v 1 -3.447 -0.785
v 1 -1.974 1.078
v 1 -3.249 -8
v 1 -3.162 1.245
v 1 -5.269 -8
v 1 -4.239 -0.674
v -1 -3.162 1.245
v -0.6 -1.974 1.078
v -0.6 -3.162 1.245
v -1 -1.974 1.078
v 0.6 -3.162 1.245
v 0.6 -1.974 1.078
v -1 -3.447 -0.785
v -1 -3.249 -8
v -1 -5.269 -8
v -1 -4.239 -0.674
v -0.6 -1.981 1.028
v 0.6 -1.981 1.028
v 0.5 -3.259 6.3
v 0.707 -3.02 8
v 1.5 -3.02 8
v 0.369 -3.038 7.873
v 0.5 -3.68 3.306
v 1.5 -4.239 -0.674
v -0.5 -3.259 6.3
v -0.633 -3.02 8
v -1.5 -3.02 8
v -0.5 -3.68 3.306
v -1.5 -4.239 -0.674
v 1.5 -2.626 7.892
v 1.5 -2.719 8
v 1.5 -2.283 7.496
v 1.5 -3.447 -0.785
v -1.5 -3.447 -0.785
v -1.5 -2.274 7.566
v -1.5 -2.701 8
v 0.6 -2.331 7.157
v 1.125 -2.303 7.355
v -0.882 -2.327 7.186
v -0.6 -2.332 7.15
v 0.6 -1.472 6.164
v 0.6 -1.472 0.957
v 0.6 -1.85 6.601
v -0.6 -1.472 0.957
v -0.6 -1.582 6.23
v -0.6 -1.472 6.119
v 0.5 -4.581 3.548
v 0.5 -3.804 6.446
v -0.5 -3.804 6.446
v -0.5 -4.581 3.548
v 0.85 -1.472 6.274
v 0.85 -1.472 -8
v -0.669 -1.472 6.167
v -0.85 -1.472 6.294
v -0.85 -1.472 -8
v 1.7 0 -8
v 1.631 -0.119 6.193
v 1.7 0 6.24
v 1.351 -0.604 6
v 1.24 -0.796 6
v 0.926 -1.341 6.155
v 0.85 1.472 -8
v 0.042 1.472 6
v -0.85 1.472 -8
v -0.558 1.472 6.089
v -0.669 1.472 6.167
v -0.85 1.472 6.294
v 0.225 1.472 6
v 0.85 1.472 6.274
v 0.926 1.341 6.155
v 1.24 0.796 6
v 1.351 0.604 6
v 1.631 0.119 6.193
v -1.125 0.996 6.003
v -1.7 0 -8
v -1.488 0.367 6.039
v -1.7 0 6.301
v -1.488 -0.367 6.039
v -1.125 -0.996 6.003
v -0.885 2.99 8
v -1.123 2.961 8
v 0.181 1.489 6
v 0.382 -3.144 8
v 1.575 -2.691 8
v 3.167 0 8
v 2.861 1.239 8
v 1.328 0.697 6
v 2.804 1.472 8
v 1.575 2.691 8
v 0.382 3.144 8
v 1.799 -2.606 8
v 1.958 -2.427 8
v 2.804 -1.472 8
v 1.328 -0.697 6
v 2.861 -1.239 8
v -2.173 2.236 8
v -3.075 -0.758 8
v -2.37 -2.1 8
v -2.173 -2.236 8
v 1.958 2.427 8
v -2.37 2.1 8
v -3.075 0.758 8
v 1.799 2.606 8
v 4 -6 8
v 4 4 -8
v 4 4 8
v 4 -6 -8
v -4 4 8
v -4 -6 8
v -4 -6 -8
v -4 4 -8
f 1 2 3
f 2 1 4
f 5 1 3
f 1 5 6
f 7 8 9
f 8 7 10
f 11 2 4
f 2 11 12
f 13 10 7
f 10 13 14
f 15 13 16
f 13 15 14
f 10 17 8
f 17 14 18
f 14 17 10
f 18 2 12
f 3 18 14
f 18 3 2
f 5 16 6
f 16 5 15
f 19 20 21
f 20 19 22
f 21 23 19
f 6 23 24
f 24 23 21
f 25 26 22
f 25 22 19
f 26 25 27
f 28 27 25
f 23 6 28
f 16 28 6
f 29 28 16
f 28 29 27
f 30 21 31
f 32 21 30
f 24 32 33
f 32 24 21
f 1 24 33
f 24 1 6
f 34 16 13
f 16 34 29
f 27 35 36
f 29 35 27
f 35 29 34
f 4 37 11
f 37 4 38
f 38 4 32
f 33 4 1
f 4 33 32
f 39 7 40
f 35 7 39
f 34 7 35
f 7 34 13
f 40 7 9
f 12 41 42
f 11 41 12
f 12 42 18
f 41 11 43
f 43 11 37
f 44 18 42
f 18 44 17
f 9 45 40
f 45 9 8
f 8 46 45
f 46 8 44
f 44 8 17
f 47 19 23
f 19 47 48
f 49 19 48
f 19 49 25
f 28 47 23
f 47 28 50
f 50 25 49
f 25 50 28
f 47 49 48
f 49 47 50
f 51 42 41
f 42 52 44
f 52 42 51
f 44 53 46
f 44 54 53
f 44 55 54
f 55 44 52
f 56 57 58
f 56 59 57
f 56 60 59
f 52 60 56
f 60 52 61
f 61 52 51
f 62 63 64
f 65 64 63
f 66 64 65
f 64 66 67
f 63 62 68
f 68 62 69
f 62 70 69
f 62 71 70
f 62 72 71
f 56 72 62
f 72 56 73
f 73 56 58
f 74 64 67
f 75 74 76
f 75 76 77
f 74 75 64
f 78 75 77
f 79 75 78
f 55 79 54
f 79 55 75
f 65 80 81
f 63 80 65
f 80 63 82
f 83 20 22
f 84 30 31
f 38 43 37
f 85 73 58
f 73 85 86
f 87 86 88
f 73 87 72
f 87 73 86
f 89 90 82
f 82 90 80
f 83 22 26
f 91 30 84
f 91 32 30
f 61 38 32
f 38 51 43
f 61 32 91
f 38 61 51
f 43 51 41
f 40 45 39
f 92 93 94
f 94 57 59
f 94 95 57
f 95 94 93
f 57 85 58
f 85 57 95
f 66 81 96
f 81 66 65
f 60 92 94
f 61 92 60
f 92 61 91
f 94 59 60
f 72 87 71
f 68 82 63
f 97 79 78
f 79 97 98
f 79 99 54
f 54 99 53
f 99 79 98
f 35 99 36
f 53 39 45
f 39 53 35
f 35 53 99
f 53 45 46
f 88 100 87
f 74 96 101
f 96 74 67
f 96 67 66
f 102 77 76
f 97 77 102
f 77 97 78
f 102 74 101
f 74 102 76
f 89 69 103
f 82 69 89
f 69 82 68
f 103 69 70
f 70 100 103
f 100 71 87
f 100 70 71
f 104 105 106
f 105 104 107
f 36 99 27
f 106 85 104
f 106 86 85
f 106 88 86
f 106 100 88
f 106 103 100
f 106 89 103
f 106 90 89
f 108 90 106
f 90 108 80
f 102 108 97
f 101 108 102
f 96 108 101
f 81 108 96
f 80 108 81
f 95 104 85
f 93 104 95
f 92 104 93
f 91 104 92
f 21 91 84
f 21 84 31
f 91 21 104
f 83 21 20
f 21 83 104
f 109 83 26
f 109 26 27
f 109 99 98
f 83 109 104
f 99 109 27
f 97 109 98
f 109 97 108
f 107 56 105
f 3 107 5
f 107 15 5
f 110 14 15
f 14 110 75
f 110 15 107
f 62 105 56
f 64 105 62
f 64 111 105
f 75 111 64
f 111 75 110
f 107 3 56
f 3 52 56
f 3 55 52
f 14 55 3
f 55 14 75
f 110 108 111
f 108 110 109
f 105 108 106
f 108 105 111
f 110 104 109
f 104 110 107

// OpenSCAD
// $fn = 60;

// Pin position with angular coordinates
module make_pin() {
	r_pin_circle = 44 / 2;
	alpha = 360 / 14;

	for (i=[0:13])
		rotate([0, 0, (i + 0.5) * alpha])
			translate([0, r_pin_circle, 0])
				children();
}

module contact() {
	rotate([0, 90, 0])
		linear_extrude(1.5, center=true)
			translate([-0.7, -1.25, 0])
				import("spring.svg");
}

module pin() {
	translate([0, 0, -3])
		cylinder(h=6, d1=3, d2=2.25, center=true);

	translate([0, 0, 3])
		cylinder(h=6, d2=3, d1=2.25, center=true);
}

module pocket() {
	// Square section for cable and crimp connection
	translate([0, -3, -5])
		cube(size=[2.0, 2.0, 10.1], center=true);
	// Wider section at the top, for the flat end of the contact
	translate([0, -3.6, 3])
		cube(size=[3.0, 0.8, 10], center=true);
	// Opening for the contact spring
	translate([0, -2.5, 3.5])
		cube(size=[1.2, 3, 7], center=true);
	// Pocket for the little hook to engage in
	translate([0, -3.75, 3.5])
		rotate([-7, 0, 0])
			cube(size=[1, 2, 3], center=true);
}

module pocket2() {
	cylinder(h=20, d=3.4, center=true);
	rotate([-8, 0, 0])
		pocket();
	translate([0, 0, 3.75 + 3])
		cylinder(h=3, d1=3, d2=8, center=true);
}

// cylinder(h=20, d=43, center=true);
// make_pin()
// 	cylinder(h=16, d=2, center=true);

// color("red")
// 	rotate([-5, 0, 0])
// 		translate([0, -3.1, 4])
// 			contact();


// Little cube for fine-tuning the geometry
intersection() {
	difference() {
		translate([0, -1, 0])
			cube(size=[8, 10, 16], center=true);
		translate([0, 0, 0.75])
			pocket2();
	}
	// translate([-50, 0, 0])
	// 	cube(size=[100, 100, 100], center=true);
}


// the notched pin in the middle
module central_pin() {
	cylinder(h=20, d=20.5, center=true);
	translate([0, -20.5 / 2, 0])
		cylinder(h=20, d=3, center=true);
}


module socket() {
	difference() {
		cylinder(h=16, d=62, center=true);
		make_pin()
			translate([0, 0, 0.75])
				rotate([0, 0, 180])
					pocket2();
		scale(1.1)
			central_pin();
		cylinder(h=20, d1=10.5, d2=30, center=true);
	}
}

// socket();
